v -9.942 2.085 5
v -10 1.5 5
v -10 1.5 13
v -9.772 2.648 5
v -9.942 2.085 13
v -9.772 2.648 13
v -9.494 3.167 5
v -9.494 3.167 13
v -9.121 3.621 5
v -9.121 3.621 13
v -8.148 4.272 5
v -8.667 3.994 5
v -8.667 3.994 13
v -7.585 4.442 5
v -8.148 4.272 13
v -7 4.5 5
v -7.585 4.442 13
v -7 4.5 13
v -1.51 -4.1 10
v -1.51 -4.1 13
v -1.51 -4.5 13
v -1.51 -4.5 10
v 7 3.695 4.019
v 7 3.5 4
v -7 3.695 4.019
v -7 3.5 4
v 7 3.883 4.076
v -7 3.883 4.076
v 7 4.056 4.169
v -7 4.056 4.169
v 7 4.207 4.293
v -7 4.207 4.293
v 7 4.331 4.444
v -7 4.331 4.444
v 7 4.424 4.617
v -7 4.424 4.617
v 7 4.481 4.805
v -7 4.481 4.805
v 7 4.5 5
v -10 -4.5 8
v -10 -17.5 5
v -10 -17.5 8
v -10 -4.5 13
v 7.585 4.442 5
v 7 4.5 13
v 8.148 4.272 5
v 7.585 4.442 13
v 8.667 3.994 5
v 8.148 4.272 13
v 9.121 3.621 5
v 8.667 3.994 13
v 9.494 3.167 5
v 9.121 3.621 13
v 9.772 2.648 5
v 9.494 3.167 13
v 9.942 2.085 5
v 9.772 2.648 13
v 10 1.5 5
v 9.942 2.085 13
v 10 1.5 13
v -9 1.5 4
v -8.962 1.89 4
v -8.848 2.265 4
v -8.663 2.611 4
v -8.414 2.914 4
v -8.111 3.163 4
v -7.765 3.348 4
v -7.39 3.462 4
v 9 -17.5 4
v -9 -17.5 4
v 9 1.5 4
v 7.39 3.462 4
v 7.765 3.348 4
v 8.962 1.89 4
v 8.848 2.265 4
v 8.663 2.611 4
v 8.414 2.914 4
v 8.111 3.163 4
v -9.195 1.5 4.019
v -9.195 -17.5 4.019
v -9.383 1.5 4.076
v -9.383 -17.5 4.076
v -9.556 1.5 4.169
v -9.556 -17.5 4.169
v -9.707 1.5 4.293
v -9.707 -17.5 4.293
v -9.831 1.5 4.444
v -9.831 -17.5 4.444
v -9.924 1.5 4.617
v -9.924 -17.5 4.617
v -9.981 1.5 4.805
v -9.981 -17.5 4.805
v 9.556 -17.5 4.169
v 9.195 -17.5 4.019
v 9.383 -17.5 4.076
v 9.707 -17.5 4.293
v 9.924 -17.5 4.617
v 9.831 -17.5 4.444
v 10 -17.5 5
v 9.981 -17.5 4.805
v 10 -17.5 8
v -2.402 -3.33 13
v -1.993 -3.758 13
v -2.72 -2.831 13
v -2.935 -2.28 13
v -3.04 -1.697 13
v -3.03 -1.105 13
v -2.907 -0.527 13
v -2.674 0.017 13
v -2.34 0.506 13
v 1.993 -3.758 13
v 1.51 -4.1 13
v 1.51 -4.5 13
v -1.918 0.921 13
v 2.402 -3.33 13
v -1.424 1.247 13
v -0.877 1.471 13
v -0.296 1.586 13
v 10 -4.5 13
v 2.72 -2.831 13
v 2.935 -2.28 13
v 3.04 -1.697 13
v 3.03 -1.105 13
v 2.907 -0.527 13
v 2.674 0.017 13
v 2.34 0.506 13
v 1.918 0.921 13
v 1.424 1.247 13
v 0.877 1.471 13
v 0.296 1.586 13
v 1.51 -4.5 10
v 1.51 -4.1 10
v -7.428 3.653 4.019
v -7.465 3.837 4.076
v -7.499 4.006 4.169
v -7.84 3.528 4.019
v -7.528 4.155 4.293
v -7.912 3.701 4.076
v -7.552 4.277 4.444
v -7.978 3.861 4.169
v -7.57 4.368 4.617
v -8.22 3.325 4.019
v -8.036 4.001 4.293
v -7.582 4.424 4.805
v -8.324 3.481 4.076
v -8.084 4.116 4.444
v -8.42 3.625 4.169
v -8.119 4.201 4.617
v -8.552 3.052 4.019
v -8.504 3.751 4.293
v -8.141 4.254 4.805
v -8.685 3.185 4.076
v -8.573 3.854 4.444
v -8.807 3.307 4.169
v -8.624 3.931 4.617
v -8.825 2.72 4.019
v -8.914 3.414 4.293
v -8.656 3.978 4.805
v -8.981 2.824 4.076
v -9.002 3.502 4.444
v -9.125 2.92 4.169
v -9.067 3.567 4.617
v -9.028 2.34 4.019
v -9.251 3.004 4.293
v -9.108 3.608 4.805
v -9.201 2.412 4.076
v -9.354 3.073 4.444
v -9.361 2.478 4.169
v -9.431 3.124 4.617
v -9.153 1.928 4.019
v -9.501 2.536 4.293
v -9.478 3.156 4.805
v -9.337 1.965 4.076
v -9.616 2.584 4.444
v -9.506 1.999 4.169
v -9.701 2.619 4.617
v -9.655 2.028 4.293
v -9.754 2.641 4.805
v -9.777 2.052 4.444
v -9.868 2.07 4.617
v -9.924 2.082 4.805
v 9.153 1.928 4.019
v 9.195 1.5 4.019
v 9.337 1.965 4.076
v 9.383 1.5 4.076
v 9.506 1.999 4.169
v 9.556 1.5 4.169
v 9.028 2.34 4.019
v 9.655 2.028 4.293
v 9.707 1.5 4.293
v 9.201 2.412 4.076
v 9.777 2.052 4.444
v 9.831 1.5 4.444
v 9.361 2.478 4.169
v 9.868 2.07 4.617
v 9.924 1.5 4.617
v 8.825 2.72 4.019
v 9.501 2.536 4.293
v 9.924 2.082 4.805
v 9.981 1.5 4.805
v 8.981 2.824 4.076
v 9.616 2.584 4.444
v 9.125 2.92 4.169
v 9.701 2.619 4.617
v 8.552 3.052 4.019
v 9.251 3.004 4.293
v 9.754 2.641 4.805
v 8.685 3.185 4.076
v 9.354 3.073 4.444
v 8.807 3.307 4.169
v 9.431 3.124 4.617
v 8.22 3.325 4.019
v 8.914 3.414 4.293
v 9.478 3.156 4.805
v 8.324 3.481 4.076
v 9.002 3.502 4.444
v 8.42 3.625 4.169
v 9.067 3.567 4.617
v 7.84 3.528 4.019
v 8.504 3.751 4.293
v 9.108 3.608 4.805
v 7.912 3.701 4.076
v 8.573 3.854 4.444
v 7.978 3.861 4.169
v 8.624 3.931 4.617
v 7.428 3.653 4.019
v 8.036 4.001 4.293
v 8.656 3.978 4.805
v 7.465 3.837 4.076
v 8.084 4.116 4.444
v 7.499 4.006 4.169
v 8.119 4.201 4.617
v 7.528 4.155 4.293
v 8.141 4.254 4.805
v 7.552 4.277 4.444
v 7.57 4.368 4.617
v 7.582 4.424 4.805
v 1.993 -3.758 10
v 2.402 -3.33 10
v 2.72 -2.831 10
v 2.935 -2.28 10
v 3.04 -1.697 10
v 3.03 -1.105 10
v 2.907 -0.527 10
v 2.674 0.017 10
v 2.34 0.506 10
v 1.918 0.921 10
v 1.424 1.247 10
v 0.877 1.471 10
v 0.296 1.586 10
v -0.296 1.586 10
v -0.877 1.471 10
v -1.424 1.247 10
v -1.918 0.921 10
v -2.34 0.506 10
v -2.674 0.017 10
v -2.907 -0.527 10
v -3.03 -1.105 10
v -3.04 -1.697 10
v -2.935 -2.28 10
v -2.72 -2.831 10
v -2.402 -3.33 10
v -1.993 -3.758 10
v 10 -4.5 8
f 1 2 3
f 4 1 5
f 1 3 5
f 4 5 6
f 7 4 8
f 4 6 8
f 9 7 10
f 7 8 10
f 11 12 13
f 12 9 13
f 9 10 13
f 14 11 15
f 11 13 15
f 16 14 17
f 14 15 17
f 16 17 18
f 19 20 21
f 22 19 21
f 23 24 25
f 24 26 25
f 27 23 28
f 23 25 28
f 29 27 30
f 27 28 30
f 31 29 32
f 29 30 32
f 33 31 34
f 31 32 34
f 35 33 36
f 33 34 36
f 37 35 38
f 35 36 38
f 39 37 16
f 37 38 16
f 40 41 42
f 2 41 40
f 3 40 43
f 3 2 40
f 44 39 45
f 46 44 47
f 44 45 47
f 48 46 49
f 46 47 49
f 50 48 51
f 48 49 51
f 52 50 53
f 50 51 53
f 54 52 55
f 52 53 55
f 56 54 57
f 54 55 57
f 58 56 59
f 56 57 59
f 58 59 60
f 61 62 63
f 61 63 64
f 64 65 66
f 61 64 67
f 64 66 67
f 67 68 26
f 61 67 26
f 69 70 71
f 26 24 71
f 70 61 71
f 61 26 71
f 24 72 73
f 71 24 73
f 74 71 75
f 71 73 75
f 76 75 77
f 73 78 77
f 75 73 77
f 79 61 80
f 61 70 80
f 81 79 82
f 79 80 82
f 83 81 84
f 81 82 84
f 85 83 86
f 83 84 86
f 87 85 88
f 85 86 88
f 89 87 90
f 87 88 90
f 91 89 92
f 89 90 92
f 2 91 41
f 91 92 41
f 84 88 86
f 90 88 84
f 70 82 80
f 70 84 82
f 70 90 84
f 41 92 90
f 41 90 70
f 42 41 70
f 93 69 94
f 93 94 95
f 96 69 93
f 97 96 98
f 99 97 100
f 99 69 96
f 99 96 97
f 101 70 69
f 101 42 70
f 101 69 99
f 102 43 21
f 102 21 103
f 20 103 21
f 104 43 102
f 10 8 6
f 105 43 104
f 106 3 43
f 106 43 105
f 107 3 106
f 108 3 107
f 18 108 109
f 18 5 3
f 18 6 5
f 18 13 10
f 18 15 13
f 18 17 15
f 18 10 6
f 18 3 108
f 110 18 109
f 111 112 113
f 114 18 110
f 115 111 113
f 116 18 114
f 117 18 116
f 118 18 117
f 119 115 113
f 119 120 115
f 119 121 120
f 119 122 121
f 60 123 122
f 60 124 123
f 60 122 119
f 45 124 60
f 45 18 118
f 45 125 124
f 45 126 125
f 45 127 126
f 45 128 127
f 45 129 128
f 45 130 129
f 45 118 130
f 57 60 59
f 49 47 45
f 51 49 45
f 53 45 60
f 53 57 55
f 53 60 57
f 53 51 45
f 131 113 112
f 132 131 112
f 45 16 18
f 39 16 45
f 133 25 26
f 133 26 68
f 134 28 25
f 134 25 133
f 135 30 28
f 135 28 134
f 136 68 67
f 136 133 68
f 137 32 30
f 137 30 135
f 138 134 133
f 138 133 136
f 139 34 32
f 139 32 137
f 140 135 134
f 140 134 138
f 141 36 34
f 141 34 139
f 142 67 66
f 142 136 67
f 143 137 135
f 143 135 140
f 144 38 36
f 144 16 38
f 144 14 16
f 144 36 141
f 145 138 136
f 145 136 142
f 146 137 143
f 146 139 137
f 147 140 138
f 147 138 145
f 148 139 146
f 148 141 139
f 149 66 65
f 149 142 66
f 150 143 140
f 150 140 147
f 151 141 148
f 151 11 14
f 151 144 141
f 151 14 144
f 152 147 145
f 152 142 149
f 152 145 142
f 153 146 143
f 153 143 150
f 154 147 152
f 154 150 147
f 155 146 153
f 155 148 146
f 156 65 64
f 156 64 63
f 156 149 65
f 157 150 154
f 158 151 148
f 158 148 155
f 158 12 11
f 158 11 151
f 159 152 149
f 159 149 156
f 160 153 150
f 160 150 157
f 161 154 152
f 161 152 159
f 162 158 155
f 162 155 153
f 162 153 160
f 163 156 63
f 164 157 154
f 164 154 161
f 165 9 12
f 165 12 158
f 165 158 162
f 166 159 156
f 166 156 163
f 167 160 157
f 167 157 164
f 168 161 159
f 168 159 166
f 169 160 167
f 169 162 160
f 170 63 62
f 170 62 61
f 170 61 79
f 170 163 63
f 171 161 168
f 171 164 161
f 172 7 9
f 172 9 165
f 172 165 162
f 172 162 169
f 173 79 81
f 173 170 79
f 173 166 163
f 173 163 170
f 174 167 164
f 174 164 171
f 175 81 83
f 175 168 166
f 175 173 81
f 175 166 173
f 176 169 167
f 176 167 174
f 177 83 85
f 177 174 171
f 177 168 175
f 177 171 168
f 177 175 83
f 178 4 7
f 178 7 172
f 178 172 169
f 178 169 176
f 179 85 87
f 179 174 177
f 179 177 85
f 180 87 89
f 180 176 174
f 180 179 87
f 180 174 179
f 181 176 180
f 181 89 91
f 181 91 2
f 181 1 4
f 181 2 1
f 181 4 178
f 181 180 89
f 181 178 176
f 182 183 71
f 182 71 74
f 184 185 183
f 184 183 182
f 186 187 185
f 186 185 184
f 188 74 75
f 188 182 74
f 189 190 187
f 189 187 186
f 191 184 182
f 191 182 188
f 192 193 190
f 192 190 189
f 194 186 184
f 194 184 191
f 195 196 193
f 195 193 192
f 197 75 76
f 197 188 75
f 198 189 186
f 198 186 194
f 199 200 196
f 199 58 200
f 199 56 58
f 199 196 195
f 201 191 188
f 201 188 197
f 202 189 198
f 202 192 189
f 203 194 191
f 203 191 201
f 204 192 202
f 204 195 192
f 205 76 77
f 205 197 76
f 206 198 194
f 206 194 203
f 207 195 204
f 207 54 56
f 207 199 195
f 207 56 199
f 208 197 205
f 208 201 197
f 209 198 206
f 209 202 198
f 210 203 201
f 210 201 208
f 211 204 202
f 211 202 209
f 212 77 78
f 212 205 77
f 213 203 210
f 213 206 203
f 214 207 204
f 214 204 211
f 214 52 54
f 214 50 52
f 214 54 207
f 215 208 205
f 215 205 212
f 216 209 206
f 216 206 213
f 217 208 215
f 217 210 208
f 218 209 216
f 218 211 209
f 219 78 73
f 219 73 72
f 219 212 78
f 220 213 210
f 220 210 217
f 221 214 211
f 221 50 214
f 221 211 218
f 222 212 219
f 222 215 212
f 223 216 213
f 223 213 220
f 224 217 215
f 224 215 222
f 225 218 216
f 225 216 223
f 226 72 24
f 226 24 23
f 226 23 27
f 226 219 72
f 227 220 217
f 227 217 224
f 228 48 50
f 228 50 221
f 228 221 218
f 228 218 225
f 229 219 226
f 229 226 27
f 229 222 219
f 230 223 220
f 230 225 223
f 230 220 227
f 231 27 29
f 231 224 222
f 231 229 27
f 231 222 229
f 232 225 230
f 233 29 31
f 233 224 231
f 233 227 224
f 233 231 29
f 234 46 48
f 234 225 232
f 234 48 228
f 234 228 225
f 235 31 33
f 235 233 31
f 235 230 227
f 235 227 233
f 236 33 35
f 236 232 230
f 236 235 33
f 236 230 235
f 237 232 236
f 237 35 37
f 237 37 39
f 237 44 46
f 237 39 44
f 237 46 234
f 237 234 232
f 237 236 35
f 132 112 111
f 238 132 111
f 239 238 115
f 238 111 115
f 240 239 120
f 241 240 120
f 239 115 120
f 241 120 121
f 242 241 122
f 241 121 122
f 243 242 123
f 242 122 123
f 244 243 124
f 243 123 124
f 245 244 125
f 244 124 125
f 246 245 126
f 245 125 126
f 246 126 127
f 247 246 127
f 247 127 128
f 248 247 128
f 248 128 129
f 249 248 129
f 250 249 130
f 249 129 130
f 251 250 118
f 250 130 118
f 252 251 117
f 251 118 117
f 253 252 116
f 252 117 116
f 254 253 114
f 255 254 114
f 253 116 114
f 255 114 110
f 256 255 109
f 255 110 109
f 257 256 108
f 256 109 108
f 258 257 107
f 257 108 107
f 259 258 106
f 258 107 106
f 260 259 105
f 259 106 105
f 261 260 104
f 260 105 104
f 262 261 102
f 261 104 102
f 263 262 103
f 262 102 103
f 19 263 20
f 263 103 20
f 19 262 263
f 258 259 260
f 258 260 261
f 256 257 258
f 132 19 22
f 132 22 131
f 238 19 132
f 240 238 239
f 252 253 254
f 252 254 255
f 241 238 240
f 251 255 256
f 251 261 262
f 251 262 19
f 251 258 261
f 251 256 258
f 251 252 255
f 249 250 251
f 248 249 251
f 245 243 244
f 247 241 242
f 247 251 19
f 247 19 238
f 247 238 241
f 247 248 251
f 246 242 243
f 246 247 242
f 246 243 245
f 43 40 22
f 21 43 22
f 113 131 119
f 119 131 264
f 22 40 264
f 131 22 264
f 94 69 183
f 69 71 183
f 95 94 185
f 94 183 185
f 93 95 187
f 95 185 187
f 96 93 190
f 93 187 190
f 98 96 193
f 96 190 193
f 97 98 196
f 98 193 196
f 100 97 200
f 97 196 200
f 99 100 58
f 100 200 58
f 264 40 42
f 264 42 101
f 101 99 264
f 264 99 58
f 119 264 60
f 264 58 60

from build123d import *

# Parameters (mm, degrees)
SKETCH1_W           = 20
SKETCH1_H           = 9
BOSS_EXTRUDE1_DEPTH = 13
CUT_EXTRUDE1_DEPTH  = 3
FILLET1_R           = 3
SKETCH3_W           = 20
SKETCH3_H           = 4
CUT_EXTRUDE2_DEPTH  = 61
SKETCH3_3_W         = 20
SKETCH3_3_H         = 4
BOSS_EXTRUDE2_DEPTH = 13
FILLET4_R           = 1


with BuildPart() as part:
    # Sketch1 → Boss-Extrude1 (new body)
    with BuildSketch(Plane.XY):
        Rectangle(SKETCH1_W, SKETCH1_H)
    extrude(amount=BOSS_EXTRUDE1_DEPTH)

    # Sketch2 → Cut-Extrude1 (cut)
    with BuildSketch(Plane.XY.offset(13)):
        with BuildLine():
            Line((1.51, -4.5), (1.51, -4.099981132))
            ThreePointArc((1.51, -4.099981132), (0, 1.6), (-1.51, -4.099981132))
            Line((-1.51, -4.099981132), (-1.51, -4.5))
            Line((-1.51, -4.5), (1.51, -4.5))
        make_face()
    extrude(amount=-CUT_EXTRUDE1_DEPTH, mode=Mode.SUBTRACT)

    # Fillet1
    fillet1_edges = [part.edges().sort_by_distance(p)[0] for p in [
        (-10, 4.5, 6.5),
        (10, 4.5, 6.5),
    ]]
    fillet(fillet1_edges, radius=FILLET1_R)

    # Sketch3 → Cut-Extrude2 (cut)
    with BuildSketch(Plane.XZ.offset(4.5)):
        with Locations((0, 2)):
            Rectangle(SKETCH3_W, SKETCH3_H)
    extrude(amount=-CUT_EXTRUDE2_DEPTH, mode=Mode.SUBTRACT)

    # Sketch3<3> → Boss-Extrude2 (add)
    with BuildSketch(Plane.XZ.offset(4.5)):
        with Locations((0, 6)):
            Rectangle(SKETCH3_3_W, SKETCH3_3_H)
    extrude(amount=BOSS_EXTRUDE2_DEPTH)

    # Fillet4
    fillet4_edges = [part.edges().sort_by_distance(p)[0] for p in [
        (9.121320344, 3.621320344, 4),
        (0, 4.5, 4),
        (10, -8, 4),
        (-9.121320344, 3.621320344, 4),
        (-10, -8, 4),
    ]]
    fillet(fillet4_edges, radius=FILLET4_R)


solid = part.part
